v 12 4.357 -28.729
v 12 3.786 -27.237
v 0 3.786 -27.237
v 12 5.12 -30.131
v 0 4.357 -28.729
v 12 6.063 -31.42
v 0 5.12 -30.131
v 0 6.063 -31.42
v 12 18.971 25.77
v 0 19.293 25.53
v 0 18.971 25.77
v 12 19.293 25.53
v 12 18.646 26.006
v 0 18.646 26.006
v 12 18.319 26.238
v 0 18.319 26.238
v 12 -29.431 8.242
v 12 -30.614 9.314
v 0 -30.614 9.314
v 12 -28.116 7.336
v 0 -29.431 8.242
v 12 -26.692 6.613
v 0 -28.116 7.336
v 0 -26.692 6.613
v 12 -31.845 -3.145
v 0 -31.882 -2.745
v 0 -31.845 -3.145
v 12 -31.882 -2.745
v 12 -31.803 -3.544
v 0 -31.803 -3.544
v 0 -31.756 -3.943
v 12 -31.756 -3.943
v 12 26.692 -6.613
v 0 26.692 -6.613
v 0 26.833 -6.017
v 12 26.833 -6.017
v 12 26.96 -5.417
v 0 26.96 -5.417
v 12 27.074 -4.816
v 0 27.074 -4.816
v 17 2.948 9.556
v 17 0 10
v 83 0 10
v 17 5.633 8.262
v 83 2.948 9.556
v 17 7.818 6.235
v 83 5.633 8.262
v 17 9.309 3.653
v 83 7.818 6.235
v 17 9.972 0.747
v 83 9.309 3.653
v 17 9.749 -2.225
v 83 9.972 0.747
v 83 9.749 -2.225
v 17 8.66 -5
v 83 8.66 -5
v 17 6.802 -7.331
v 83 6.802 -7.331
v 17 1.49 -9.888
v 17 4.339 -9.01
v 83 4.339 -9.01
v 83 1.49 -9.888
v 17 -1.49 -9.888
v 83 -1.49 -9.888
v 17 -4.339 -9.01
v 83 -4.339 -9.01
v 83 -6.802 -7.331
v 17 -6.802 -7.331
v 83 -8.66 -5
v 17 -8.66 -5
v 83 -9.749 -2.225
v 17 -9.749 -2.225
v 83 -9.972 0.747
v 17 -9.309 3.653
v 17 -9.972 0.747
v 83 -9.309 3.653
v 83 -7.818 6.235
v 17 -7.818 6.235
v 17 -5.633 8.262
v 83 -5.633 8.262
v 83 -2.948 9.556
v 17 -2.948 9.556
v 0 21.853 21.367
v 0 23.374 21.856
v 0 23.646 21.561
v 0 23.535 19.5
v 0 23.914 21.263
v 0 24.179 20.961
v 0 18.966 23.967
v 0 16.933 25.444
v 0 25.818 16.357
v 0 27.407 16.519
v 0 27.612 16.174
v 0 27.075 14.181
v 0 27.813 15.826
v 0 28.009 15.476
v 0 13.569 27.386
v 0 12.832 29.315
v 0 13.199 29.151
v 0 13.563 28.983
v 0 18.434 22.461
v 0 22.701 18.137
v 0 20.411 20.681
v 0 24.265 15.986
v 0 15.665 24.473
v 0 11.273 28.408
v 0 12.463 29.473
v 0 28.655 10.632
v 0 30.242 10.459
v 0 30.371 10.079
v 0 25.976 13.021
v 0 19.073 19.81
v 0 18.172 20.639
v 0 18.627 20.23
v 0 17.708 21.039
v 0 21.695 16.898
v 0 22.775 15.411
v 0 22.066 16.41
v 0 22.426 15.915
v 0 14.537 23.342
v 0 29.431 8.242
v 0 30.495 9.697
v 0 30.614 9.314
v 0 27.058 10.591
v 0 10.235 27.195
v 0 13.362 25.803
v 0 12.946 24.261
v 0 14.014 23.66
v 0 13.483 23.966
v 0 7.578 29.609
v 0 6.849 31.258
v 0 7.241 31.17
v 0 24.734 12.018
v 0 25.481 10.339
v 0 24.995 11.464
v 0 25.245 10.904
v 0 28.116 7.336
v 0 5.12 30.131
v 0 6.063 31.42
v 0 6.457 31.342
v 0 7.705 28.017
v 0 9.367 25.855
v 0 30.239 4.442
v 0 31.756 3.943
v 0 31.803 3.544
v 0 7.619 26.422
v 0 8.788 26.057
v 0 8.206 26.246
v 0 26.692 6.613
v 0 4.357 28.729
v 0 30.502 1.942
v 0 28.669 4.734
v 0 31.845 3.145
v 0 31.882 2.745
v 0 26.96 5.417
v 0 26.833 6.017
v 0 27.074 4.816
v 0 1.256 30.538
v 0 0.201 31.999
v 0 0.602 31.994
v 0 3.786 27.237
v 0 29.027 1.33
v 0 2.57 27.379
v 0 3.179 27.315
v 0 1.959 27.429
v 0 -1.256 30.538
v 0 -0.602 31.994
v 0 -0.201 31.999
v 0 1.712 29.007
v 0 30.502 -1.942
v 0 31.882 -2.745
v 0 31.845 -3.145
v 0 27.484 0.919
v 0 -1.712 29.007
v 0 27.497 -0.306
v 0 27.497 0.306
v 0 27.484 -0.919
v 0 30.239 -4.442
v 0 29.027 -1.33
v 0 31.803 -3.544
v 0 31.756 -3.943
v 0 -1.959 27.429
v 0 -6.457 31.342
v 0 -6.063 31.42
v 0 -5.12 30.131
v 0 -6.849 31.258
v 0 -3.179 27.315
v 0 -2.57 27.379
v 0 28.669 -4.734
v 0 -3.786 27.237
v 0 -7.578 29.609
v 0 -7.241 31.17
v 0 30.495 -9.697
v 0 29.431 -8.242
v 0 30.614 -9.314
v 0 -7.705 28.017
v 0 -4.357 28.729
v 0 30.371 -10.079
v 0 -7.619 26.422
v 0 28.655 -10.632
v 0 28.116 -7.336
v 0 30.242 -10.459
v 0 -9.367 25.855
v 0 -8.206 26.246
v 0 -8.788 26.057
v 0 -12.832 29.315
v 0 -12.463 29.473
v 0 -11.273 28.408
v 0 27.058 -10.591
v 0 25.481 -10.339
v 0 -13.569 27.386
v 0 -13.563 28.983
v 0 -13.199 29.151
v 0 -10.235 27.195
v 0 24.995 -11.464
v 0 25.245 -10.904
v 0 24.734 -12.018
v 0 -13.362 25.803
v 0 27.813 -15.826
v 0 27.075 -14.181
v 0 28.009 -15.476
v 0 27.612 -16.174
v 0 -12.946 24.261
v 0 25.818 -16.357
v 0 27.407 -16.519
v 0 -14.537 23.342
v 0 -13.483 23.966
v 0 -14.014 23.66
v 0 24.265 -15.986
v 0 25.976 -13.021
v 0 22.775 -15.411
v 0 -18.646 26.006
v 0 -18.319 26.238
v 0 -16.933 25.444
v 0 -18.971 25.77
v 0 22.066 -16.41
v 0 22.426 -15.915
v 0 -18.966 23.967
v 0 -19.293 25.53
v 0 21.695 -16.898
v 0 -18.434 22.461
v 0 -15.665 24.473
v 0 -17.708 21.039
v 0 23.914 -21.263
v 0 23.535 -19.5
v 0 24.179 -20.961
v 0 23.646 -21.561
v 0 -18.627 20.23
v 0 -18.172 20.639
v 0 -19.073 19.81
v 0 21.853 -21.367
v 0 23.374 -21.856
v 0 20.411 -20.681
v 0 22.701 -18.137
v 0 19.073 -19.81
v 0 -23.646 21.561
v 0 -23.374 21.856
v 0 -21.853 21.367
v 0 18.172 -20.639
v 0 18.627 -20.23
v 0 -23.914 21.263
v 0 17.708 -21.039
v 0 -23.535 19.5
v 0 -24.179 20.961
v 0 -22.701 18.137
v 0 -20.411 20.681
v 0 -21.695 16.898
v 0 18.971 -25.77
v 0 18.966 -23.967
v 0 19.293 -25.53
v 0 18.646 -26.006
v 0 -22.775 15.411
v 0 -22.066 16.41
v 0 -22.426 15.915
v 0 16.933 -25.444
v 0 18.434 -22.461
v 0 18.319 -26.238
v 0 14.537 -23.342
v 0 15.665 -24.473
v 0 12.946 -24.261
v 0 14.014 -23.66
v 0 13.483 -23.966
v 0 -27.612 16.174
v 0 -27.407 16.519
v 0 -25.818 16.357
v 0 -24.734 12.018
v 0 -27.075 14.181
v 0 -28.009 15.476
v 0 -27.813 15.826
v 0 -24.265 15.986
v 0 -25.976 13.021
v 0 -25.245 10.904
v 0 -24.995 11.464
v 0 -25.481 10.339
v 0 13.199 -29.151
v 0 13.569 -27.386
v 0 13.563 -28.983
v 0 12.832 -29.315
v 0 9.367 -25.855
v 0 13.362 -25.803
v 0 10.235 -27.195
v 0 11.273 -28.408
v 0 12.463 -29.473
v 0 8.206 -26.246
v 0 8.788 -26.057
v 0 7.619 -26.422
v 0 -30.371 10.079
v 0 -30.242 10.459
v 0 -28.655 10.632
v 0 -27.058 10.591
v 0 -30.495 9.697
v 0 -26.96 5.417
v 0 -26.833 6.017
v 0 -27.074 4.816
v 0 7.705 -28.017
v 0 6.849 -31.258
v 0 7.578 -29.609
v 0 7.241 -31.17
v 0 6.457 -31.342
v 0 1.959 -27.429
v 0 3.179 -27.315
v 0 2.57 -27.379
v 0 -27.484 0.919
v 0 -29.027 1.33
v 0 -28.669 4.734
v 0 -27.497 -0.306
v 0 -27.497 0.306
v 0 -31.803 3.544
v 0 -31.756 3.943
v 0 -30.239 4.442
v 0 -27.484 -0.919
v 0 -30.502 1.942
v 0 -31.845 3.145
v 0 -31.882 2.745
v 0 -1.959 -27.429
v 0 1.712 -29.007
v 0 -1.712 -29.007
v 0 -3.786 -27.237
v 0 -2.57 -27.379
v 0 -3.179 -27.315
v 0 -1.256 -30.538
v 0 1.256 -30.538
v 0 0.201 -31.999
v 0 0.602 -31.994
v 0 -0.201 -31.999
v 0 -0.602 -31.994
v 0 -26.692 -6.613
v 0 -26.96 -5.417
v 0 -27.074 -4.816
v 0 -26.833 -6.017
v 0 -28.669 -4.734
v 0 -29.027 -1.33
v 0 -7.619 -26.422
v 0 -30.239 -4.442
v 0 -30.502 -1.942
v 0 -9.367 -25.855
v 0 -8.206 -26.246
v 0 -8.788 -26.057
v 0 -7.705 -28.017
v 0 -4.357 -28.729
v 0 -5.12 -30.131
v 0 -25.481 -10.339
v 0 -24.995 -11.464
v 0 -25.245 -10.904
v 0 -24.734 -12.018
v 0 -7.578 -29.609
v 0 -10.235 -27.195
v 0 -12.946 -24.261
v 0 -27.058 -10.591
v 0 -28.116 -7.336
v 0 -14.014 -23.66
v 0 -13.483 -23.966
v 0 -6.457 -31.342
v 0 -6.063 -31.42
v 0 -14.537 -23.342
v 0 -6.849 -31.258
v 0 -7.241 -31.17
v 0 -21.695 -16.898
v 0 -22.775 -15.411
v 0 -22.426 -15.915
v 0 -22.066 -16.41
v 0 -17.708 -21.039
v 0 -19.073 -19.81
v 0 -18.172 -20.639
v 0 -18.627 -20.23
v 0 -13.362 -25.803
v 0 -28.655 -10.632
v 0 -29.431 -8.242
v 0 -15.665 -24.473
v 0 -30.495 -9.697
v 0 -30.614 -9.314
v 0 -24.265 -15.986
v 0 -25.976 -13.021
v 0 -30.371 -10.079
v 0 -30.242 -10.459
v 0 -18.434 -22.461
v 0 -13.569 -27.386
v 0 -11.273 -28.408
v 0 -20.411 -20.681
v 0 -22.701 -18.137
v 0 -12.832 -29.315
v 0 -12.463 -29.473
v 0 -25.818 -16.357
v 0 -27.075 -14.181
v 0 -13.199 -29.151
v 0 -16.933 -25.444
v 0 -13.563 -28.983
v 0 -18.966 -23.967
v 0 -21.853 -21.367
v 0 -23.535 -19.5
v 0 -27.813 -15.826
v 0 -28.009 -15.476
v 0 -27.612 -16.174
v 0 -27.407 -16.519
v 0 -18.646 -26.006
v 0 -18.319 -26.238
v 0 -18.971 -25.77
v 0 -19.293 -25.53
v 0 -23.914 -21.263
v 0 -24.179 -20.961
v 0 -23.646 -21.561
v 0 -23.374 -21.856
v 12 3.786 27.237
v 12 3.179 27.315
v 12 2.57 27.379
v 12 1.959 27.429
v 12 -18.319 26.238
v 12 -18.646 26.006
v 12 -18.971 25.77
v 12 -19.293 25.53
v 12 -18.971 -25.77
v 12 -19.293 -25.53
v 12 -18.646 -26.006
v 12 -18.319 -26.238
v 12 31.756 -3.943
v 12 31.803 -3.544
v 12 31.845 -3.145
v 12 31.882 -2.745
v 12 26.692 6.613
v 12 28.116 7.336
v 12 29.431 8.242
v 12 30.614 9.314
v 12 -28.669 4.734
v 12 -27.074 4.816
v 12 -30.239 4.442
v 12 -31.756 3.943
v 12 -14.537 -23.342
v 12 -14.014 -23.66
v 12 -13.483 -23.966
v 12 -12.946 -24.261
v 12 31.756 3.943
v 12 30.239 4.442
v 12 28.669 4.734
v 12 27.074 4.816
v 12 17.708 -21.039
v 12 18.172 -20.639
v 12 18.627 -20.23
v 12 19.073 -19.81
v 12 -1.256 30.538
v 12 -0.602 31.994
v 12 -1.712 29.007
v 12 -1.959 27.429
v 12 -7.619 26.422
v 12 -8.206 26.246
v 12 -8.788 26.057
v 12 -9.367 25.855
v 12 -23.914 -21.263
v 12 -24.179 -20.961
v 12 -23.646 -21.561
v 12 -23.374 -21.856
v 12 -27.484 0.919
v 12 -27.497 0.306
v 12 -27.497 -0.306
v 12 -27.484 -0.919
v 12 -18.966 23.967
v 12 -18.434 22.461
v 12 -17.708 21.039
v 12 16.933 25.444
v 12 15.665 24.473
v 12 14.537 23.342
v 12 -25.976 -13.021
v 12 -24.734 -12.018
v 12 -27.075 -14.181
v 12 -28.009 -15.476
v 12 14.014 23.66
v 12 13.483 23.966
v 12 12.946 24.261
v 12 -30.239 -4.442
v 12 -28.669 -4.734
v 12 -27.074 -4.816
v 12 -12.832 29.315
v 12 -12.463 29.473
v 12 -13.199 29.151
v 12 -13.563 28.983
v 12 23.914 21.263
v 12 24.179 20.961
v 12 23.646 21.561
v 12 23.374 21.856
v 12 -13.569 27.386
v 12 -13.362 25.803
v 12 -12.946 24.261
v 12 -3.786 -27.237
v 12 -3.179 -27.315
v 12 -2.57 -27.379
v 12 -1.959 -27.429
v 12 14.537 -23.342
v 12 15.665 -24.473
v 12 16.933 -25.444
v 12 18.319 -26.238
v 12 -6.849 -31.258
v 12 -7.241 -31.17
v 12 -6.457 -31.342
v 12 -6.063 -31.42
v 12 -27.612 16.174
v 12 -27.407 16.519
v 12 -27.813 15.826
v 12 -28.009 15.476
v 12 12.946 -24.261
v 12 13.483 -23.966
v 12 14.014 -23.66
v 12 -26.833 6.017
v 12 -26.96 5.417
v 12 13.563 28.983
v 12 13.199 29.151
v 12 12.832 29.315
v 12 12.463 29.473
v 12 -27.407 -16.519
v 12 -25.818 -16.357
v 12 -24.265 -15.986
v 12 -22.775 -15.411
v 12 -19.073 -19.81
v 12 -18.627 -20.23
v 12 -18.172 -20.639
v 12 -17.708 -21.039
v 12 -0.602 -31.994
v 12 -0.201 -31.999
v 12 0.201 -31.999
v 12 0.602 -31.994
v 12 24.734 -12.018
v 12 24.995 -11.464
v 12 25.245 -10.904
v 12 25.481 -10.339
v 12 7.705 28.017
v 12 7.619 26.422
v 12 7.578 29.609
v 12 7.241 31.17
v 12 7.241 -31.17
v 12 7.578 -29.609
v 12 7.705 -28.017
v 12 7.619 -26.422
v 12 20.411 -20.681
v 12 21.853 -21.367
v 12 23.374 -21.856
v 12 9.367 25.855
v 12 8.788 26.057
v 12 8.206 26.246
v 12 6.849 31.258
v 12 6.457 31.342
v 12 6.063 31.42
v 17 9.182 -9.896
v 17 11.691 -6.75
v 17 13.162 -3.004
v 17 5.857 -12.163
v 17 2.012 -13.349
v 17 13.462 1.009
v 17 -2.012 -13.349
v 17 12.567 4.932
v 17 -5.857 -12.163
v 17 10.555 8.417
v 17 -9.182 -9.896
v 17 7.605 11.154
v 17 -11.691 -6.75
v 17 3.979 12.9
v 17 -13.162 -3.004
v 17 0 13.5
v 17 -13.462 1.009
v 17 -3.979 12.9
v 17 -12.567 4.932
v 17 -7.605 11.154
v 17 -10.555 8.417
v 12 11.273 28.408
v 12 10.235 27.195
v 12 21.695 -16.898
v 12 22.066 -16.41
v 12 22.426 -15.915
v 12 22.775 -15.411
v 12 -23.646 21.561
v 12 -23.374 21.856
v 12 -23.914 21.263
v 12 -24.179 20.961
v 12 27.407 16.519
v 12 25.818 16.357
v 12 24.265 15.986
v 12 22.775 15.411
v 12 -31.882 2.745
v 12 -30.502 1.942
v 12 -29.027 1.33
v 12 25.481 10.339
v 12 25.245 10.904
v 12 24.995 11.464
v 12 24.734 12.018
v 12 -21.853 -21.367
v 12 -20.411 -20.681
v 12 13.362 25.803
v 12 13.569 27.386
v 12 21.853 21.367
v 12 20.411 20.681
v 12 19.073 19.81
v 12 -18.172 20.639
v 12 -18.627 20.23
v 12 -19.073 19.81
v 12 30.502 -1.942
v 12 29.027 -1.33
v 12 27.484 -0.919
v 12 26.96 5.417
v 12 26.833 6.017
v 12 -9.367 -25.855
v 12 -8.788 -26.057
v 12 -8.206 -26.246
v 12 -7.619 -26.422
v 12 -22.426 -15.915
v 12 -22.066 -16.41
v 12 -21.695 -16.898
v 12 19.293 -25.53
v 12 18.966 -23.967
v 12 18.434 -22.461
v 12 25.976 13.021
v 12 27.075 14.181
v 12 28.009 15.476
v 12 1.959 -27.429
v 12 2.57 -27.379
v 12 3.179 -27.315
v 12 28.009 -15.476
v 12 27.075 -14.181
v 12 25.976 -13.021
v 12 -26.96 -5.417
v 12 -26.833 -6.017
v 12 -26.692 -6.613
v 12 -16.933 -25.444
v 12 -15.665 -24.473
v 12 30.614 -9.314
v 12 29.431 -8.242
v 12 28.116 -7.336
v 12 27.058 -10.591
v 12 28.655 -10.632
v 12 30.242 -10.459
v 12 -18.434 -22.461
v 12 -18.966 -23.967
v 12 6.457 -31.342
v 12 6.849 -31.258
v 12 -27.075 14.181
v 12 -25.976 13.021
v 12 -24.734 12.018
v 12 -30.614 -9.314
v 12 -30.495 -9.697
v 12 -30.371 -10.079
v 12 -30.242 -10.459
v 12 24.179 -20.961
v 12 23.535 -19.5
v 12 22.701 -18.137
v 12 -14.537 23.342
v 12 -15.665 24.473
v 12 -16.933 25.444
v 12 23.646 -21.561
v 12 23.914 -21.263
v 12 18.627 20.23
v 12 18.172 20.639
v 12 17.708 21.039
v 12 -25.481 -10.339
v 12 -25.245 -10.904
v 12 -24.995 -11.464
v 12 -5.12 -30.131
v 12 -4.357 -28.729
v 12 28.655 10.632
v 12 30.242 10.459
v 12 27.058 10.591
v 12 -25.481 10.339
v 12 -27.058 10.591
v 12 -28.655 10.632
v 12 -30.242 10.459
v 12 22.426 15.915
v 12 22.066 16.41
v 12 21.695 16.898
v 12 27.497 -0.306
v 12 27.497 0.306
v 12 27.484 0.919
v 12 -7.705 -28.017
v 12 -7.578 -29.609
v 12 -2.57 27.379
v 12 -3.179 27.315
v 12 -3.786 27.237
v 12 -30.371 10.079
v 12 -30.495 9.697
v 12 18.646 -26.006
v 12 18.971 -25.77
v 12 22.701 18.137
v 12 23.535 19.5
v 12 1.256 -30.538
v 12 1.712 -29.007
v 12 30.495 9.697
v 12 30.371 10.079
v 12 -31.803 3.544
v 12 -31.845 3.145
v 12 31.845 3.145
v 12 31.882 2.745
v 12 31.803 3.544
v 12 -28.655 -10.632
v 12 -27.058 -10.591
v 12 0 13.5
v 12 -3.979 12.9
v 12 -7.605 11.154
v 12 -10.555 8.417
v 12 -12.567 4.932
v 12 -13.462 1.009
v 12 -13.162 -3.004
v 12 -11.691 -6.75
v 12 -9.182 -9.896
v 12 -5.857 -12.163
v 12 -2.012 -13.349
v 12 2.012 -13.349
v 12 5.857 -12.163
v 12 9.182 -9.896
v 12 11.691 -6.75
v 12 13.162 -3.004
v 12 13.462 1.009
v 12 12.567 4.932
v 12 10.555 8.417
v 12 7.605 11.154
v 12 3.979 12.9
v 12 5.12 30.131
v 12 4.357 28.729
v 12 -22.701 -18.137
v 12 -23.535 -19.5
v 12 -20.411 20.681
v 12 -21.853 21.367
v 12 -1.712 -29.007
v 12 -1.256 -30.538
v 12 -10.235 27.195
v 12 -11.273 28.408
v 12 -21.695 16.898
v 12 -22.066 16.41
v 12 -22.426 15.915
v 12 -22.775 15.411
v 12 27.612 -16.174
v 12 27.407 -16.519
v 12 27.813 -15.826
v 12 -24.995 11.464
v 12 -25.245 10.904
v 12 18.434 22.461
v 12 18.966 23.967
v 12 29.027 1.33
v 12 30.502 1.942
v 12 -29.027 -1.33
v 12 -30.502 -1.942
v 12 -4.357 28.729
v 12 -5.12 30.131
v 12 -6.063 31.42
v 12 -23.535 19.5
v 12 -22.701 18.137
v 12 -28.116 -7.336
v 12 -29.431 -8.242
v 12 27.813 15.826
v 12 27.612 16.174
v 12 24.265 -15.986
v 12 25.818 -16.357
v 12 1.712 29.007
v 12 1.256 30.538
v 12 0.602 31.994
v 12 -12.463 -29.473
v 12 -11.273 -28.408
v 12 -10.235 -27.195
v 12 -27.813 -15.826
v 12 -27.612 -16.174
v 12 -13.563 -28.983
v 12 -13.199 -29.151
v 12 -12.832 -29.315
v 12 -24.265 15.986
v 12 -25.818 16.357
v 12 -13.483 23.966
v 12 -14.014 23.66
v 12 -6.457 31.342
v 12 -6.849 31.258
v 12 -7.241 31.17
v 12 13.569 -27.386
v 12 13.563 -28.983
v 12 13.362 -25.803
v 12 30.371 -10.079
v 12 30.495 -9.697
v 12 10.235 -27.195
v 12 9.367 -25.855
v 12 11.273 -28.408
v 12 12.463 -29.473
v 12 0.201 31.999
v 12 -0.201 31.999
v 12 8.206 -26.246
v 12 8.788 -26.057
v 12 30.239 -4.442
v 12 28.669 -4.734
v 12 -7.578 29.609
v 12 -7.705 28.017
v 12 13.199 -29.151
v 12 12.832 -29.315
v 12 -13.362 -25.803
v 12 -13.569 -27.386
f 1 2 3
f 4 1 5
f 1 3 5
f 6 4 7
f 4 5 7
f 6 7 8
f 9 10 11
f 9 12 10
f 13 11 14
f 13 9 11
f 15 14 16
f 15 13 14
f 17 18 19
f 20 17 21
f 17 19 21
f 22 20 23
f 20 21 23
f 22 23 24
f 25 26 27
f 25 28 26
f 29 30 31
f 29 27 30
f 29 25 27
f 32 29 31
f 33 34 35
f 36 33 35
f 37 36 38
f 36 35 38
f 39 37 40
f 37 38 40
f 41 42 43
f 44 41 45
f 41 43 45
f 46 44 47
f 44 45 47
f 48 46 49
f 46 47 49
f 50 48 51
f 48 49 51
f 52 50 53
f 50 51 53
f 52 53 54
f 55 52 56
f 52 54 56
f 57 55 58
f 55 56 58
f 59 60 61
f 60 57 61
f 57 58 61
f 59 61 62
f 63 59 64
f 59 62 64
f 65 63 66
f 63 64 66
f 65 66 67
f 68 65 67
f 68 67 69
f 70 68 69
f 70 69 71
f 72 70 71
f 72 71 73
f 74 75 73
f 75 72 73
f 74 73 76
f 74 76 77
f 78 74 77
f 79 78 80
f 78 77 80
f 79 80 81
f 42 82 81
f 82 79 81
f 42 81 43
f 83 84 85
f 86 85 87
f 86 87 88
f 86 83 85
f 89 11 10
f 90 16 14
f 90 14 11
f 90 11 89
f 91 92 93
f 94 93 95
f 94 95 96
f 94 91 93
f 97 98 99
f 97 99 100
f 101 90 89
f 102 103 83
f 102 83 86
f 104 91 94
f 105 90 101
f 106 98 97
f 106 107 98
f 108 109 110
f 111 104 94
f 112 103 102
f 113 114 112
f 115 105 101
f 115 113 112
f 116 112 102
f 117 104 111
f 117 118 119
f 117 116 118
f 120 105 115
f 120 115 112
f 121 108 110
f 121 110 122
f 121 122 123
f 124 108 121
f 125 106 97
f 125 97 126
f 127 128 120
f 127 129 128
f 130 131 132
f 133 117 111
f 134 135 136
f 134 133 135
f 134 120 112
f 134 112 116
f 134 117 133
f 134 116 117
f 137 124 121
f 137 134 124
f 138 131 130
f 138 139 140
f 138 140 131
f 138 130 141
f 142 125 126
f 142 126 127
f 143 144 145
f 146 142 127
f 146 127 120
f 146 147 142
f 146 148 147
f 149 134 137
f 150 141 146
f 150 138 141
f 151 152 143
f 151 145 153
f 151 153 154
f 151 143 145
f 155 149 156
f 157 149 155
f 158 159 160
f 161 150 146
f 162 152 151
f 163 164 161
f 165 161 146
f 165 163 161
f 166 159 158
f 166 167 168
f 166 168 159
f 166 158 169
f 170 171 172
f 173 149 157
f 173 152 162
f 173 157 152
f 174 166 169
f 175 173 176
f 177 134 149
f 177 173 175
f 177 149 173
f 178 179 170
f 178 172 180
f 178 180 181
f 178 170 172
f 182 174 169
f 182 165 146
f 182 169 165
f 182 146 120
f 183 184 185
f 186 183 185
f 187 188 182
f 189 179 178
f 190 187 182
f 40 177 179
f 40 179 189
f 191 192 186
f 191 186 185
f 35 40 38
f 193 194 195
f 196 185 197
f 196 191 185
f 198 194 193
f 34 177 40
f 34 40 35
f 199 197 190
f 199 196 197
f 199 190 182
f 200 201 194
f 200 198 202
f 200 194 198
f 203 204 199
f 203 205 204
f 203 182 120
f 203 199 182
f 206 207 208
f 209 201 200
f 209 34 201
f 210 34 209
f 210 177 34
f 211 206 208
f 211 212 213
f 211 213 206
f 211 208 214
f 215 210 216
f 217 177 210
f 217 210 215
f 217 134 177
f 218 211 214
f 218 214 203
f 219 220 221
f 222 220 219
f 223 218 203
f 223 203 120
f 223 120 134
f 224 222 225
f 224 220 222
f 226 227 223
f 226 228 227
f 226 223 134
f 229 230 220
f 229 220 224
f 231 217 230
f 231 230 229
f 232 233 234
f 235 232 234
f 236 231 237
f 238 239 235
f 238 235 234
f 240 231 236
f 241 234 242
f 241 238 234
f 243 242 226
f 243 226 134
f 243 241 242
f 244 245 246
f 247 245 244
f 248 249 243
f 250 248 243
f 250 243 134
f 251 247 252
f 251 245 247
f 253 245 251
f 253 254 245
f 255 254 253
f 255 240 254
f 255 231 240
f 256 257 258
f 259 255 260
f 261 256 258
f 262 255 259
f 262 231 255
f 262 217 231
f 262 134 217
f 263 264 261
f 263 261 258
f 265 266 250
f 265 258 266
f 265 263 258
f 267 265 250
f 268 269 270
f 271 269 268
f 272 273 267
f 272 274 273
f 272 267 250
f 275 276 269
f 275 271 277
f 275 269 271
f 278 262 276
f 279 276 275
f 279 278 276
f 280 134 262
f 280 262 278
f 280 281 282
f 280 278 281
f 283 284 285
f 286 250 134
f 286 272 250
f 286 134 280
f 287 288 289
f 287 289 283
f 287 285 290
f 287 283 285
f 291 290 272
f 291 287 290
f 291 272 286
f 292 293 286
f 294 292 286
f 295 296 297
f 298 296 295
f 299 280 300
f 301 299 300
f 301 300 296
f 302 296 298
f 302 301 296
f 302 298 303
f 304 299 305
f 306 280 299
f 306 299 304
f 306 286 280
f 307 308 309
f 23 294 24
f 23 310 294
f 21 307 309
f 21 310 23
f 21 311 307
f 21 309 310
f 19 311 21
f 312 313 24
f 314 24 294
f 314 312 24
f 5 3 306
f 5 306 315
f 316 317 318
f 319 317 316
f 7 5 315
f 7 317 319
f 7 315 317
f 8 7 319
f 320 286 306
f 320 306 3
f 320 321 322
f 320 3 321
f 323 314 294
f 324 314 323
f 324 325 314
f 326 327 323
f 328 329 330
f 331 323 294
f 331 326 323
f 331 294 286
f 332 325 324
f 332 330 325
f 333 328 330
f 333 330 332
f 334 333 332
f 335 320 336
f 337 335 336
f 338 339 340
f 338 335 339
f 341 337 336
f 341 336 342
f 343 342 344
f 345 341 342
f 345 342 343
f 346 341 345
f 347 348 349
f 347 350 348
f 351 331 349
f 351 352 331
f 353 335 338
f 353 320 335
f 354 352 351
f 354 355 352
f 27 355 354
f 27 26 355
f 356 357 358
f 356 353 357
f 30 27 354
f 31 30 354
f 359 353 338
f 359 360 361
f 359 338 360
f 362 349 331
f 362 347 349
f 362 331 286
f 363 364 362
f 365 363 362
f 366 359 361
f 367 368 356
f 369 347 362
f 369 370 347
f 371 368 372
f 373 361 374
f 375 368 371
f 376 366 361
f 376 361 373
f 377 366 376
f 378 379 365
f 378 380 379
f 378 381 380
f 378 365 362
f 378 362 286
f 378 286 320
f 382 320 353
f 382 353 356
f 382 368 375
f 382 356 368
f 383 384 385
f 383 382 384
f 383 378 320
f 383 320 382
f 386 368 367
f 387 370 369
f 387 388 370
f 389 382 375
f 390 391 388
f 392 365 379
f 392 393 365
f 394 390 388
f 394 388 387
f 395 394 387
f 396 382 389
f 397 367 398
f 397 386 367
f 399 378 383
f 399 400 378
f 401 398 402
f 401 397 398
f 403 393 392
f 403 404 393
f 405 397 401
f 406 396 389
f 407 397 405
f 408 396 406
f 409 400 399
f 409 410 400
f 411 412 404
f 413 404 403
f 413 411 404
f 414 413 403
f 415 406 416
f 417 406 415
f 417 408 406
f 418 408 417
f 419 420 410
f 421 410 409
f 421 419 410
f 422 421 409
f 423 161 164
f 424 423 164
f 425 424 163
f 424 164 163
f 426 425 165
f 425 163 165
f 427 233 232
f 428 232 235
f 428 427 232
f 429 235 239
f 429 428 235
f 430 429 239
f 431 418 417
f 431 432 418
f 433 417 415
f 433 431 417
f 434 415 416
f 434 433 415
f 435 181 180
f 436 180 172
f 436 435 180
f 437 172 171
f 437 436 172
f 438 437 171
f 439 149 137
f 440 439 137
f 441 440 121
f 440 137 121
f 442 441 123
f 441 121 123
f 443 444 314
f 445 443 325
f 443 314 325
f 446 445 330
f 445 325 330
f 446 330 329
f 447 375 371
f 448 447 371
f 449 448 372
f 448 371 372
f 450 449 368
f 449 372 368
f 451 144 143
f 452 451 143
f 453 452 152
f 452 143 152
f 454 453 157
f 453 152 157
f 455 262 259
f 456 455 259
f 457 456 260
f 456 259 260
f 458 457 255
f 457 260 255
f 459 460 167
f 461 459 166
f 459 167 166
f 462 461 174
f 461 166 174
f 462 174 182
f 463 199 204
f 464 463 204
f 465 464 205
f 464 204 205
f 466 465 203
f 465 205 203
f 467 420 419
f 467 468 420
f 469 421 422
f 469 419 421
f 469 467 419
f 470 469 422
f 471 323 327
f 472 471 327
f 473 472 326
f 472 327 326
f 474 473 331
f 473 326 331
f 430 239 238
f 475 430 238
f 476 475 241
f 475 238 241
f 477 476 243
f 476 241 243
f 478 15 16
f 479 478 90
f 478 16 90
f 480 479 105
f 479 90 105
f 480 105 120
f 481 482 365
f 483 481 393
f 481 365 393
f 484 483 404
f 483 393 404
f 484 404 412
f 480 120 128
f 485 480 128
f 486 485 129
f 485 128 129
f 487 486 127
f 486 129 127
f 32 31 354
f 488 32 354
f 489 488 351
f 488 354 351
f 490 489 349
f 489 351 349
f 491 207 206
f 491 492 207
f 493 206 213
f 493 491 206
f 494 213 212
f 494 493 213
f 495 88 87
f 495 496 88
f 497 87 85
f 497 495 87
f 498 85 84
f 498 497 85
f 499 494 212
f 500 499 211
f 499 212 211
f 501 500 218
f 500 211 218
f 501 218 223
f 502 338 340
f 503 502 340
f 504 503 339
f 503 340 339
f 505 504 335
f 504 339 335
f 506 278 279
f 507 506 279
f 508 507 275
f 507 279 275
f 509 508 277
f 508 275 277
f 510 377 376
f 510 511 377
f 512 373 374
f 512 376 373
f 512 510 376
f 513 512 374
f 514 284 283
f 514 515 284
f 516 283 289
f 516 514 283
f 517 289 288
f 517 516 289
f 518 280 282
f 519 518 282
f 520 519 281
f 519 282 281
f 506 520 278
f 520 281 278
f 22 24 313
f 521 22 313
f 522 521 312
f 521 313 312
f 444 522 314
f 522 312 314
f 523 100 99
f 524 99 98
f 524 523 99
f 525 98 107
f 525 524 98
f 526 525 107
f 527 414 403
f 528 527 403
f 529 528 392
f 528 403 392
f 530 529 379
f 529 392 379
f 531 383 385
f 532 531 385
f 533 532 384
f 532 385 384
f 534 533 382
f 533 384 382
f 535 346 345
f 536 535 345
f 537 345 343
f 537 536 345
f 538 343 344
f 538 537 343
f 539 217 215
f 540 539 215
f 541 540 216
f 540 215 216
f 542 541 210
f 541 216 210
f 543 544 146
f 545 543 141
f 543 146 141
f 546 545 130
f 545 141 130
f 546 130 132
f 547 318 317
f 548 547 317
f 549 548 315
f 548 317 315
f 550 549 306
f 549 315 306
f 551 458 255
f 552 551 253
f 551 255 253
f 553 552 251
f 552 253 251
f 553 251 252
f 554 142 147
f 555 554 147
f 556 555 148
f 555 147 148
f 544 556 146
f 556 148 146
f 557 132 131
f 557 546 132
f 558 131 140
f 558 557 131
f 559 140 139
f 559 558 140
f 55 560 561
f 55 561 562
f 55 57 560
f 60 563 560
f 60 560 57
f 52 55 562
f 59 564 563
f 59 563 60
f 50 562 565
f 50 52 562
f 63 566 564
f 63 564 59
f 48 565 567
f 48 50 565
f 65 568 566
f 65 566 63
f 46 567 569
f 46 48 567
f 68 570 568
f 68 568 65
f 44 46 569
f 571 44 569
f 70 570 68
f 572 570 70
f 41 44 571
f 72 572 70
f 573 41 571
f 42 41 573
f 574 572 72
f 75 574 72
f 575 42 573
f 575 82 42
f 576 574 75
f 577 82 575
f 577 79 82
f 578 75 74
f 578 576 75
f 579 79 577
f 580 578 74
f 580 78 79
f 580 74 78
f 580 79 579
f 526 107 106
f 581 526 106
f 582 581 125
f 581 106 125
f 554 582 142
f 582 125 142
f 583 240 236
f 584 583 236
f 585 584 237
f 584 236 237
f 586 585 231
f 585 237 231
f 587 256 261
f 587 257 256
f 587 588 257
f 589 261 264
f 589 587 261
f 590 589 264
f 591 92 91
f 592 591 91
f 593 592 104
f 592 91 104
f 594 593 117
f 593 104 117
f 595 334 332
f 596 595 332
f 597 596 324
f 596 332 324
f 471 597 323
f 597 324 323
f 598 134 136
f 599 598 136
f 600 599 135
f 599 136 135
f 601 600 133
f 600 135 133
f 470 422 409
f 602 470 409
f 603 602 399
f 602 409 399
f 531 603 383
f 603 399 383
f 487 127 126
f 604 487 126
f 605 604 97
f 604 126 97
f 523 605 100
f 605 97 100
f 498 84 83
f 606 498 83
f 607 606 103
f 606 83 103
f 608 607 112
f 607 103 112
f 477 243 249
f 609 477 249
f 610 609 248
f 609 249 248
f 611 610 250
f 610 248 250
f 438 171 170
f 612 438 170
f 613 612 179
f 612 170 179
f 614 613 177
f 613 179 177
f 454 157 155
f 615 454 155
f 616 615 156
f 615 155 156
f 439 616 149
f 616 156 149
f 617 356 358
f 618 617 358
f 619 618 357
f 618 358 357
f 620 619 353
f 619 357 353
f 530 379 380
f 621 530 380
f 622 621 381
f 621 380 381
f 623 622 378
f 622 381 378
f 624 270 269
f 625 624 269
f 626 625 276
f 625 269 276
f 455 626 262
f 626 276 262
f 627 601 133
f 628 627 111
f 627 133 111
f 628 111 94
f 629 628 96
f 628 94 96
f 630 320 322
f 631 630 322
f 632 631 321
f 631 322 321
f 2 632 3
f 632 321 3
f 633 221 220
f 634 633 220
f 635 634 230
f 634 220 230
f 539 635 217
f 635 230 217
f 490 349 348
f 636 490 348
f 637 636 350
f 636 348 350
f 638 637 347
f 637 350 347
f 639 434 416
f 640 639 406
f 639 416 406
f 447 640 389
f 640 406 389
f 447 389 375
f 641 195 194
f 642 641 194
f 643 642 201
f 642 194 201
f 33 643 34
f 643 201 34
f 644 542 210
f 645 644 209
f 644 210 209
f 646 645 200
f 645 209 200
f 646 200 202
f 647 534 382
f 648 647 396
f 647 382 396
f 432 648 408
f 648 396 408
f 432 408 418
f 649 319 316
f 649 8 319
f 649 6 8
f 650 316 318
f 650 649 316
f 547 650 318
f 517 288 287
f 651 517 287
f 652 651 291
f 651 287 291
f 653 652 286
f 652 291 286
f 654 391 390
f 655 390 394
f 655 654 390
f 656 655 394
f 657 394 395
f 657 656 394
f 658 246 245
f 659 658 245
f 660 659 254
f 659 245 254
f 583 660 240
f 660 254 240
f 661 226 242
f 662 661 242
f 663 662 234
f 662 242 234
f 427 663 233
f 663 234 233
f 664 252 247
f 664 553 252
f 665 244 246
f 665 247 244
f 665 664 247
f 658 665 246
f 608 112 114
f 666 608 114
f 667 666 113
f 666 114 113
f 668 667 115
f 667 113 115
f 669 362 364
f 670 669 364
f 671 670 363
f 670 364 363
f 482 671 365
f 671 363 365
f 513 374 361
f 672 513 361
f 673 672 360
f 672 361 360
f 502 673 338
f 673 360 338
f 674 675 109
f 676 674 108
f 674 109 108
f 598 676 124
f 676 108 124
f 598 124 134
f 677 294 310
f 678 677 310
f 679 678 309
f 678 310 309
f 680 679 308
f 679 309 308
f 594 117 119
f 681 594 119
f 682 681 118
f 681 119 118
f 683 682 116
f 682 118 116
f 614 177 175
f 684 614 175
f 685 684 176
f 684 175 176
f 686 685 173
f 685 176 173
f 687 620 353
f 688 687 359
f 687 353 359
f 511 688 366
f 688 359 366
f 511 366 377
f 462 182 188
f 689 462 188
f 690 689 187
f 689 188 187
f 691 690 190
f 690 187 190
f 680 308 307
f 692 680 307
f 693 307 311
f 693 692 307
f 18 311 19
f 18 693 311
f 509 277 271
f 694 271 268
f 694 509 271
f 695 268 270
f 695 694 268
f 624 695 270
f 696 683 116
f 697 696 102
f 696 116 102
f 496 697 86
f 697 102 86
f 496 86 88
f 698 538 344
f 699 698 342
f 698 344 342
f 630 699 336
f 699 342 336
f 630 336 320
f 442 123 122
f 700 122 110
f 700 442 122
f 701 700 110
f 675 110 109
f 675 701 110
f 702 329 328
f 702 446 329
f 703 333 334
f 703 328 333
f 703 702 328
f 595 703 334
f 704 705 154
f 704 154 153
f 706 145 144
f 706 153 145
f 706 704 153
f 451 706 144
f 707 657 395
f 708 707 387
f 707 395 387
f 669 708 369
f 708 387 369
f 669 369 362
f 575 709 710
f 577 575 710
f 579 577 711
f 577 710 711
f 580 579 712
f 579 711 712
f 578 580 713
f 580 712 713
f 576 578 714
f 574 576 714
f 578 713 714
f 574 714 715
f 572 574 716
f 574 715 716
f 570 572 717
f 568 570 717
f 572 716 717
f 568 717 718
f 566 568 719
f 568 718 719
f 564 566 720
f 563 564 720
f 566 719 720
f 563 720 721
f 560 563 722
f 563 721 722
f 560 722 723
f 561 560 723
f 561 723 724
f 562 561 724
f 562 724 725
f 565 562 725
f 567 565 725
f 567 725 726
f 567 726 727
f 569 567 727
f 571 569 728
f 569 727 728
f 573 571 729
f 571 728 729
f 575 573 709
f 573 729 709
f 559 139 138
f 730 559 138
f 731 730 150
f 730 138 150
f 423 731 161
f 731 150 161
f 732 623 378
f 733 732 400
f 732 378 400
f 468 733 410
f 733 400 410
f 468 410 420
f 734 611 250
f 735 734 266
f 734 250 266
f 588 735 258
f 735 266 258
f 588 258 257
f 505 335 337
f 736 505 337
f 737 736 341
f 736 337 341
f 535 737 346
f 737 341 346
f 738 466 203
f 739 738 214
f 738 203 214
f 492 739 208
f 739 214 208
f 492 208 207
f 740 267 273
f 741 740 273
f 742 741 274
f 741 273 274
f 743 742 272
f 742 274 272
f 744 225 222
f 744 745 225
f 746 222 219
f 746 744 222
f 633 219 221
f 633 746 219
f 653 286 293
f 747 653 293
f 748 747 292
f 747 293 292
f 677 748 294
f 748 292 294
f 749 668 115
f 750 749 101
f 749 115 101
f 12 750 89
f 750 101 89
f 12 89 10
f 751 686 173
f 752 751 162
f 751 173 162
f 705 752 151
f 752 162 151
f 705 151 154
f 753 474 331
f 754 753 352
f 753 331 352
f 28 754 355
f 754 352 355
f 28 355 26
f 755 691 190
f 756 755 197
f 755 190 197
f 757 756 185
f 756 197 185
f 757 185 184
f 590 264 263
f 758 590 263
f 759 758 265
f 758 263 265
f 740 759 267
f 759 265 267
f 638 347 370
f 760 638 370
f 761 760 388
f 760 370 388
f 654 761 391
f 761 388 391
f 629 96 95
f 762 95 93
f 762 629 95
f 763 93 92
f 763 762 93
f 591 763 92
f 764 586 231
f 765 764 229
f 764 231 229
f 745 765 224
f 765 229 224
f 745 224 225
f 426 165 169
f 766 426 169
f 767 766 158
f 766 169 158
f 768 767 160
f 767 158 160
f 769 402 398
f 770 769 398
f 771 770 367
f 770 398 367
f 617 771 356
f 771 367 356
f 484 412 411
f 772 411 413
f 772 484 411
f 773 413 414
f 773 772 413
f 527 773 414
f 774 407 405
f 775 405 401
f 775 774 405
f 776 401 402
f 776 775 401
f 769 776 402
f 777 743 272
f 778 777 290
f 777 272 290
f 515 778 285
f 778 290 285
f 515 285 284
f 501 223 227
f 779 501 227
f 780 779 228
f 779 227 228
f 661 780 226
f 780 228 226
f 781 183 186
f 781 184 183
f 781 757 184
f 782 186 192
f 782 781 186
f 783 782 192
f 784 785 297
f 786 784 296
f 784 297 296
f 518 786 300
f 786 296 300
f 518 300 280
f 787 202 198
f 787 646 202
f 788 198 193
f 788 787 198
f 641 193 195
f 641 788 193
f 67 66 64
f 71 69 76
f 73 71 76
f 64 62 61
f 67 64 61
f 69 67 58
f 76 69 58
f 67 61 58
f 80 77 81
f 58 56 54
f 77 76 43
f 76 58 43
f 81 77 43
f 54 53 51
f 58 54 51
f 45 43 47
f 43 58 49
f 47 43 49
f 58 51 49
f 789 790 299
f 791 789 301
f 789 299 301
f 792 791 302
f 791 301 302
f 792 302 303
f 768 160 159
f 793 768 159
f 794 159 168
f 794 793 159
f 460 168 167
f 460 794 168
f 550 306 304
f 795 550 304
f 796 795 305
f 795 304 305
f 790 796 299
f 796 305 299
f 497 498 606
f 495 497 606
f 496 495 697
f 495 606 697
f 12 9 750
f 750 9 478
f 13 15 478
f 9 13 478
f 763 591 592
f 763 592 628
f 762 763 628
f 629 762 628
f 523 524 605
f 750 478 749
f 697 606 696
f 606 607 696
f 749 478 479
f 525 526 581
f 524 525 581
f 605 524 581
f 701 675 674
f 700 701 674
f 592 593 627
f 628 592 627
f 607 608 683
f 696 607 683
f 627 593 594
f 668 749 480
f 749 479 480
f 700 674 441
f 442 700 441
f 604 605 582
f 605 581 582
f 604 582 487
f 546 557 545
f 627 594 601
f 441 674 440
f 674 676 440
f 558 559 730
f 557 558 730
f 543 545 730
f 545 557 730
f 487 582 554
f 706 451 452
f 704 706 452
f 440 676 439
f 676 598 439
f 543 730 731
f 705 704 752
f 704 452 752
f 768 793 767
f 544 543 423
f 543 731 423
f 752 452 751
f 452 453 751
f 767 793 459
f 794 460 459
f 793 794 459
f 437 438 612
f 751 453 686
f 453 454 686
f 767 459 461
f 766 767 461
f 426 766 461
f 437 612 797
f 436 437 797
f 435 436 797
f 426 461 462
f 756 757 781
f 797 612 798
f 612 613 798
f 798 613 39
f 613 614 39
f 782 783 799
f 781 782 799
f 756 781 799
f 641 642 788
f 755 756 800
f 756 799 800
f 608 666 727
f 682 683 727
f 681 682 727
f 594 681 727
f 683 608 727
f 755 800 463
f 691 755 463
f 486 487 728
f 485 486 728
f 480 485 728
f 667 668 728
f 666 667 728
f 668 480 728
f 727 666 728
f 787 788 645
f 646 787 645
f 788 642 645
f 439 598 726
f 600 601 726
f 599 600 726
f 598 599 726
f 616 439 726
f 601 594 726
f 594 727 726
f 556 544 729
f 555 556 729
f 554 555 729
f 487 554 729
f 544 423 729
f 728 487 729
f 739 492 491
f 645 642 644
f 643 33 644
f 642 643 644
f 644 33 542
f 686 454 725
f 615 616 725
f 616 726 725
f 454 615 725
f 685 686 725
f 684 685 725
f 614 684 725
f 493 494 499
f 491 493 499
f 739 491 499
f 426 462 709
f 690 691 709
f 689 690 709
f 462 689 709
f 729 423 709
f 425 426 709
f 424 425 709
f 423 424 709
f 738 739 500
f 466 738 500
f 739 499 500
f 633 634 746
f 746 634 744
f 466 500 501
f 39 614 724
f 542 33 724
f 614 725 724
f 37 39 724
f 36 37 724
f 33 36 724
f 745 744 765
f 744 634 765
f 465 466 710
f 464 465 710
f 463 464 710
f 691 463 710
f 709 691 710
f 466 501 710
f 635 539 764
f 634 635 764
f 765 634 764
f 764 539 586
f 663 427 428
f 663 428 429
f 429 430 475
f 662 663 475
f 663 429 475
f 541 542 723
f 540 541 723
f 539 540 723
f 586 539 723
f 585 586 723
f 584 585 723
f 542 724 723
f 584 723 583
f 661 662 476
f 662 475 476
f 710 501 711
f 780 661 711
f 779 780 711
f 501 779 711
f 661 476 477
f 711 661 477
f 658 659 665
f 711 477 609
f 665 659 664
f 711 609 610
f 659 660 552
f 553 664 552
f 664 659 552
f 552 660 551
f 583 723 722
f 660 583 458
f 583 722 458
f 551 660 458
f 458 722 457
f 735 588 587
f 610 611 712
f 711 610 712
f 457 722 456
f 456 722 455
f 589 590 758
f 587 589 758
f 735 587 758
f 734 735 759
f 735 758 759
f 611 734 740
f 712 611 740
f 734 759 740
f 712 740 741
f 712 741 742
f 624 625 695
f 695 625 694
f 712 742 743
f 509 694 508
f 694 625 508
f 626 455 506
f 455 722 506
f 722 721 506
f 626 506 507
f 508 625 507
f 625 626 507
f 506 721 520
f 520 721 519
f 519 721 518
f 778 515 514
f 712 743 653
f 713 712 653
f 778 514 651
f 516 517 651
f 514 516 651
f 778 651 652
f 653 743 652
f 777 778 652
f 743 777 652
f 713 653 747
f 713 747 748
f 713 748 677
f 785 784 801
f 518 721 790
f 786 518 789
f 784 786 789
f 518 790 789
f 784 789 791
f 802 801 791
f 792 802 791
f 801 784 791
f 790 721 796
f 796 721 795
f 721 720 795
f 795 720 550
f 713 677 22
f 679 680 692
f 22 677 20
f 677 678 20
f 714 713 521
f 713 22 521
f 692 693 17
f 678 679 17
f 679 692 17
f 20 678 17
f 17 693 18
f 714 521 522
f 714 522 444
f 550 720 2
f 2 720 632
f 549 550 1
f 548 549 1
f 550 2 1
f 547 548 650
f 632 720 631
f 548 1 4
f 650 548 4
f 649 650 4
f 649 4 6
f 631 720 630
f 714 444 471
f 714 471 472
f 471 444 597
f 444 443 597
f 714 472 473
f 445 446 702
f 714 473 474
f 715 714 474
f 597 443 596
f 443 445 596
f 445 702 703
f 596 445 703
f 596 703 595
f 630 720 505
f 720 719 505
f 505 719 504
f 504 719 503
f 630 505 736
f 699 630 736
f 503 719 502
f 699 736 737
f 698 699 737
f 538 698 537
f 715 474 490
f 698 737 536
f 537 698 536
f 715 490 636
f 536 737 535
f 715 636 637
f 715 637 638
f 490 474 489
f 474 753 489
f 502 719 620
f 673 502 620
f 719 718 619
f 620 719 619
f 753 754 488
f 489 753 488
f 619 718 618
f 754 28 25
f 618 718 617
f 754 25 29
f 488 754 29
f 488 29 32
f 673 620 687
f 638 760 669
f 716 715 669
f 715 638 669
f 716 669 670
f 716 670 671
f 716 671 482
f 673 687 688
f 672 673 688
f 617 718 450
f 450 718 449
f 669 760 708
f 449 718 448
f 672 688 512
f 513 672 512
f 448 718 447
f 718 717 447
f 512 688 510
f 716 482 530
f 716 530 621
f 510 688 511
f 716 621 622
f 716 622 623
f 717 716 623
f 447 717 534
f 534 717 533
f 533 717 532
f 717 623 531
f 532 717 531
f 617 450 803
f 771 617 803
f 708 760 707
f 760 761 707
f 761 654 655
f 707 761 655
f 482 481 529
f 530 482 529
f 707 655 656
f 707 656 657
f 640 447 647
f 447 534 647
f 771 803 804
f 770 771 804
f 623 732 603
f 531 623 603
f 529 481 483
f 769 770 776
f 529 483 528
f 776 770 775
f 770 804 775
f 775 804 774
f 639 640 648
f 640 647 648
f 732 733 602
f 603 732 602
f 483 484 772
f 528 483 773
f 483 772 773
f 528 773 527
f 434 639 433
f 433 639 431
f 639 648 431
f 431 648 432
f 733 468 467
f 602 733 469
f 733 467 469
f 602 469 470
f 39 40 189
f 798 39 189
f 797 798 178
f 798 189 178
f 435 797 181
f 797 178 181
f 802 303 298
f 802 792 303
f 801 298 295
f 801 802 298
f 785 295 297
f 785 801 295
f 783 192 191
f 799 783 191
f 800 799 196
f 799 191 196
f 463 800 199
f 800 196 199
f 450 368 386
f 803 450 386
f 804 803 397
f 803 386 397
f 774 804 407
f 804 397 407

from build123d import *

# Parameters (mm, degrees)
BASPROSKE_W         = 12
BASPROSKE_H         = 32
TOOTHCUT_DEPTH      = 47.818799643
TEETHCUTS_COUNT     = 30
TEETHCUTS_ANGLE     = 348
BORSKE_R            = 10
BORE_DEPTH          = 50.0000508
BOSS_EXTRUDE1_START = -83
SKETCH1_R           = 10
BOSS_EXTRUDE1_DEPTH = 83
SKETCH3_R           = 13.5
BOSS_EXTRUDE2_DEPTH = 5


with BuildPart() as part:
    # BasProSke → Base-Revolve (revolve)
    with BuildSketch(Plane(origin=(0, 0, 0), x_dir=(1, 0, 0), z_dir=(0, 1, 0)), mode=Mode.PRIVATE) as base_revolve_sk:
        with Locations((6, 16)):
            Rectangle(BASPROSKE_W, BASPROSKE_H)
    revolve(base_revolve_sk.sketch.rotate(Axis((-10, 0, 0), (1, 0, 0)), 180), axis=Axis((-10, 0, 0), (1, 0, 0)))

    # TooCutSke → ToothCut (cut, through all)
    with BuildSketch(Plane(origin=(0, 0, 0), x_dir=(0, 0, -1), z_dir=(1, 0, 0))):
        with BuildLine():
            ThreePointArc((0.918551563, 27.483654488), (0, 27.499), (-0.918551563, 27.483654488))
            ThreePointArc((-0.918551563, 27.483654488), (-1.617208176, 29.787801627), (-2.761784709, 31.906093311))
            ThreePointArc((-2.761784709, 31.906093311), (0, 32.0254), (2.761784709, 31.906093311))
            ThreePointArc((2.761784709, 31.906093311), (1.617208176, 29.787801627), (0.918551563, 27.483654488))
        make_face()
    toothcut = extrude(amount=TOOTHCUT_DEPTH, mode=Mode.SUBTRACT)

    # TeethCuts: ToothCut ×30 about axis
    teethcuts_axis = Axis((-10, 0, 0), (1, 0, 0))
    for i in range(1, TEETHCUTS_COUNT):
        add(toothcut.rotate(teethcuts_axis, i * TEETHCUTS_ANGLE / (TEETHCUTS_COUNT - 1)), mode=Mode.SUBTRACT)

    # BorSke → Bore (cut, symmetric)
    with BuildSketch(Plane(origin=(0, 0, 0), x_dir=(0, 0, -1), z_dir=(1, 0, 0))):
        with Locations(Location((0, 0, 0), (0, 0, 180))):
            Circle(BORSKE_R)
    extrude(amount=BORE_DEPTH, both=True, mode=Mode.SUBTRACT)

    # Sketch1 → Boss-Extrude1 (add)
    with BuildSketch(Plane.ZY.offset(BOSS_EXTRUDE1_START)):
        Circle(SKETCH1_R)
    extrude(amount=BOSS_EXTRUDE1_DEPTH)

    # Sketch3 → Boss-Extrude2 (add)
    with BuildSketch(Plane(origin=(12, 0, 0), x_dir=(0, 0, -1), z_dir=(1, 0, 0))):
        with Locations(Location((0, 0, 0), (0, 0, 180))):
            Circle(SKETCH3_R)
    extrude(amount=BOSS_EXTRUDE2_DEPTH)


solid = part.part
